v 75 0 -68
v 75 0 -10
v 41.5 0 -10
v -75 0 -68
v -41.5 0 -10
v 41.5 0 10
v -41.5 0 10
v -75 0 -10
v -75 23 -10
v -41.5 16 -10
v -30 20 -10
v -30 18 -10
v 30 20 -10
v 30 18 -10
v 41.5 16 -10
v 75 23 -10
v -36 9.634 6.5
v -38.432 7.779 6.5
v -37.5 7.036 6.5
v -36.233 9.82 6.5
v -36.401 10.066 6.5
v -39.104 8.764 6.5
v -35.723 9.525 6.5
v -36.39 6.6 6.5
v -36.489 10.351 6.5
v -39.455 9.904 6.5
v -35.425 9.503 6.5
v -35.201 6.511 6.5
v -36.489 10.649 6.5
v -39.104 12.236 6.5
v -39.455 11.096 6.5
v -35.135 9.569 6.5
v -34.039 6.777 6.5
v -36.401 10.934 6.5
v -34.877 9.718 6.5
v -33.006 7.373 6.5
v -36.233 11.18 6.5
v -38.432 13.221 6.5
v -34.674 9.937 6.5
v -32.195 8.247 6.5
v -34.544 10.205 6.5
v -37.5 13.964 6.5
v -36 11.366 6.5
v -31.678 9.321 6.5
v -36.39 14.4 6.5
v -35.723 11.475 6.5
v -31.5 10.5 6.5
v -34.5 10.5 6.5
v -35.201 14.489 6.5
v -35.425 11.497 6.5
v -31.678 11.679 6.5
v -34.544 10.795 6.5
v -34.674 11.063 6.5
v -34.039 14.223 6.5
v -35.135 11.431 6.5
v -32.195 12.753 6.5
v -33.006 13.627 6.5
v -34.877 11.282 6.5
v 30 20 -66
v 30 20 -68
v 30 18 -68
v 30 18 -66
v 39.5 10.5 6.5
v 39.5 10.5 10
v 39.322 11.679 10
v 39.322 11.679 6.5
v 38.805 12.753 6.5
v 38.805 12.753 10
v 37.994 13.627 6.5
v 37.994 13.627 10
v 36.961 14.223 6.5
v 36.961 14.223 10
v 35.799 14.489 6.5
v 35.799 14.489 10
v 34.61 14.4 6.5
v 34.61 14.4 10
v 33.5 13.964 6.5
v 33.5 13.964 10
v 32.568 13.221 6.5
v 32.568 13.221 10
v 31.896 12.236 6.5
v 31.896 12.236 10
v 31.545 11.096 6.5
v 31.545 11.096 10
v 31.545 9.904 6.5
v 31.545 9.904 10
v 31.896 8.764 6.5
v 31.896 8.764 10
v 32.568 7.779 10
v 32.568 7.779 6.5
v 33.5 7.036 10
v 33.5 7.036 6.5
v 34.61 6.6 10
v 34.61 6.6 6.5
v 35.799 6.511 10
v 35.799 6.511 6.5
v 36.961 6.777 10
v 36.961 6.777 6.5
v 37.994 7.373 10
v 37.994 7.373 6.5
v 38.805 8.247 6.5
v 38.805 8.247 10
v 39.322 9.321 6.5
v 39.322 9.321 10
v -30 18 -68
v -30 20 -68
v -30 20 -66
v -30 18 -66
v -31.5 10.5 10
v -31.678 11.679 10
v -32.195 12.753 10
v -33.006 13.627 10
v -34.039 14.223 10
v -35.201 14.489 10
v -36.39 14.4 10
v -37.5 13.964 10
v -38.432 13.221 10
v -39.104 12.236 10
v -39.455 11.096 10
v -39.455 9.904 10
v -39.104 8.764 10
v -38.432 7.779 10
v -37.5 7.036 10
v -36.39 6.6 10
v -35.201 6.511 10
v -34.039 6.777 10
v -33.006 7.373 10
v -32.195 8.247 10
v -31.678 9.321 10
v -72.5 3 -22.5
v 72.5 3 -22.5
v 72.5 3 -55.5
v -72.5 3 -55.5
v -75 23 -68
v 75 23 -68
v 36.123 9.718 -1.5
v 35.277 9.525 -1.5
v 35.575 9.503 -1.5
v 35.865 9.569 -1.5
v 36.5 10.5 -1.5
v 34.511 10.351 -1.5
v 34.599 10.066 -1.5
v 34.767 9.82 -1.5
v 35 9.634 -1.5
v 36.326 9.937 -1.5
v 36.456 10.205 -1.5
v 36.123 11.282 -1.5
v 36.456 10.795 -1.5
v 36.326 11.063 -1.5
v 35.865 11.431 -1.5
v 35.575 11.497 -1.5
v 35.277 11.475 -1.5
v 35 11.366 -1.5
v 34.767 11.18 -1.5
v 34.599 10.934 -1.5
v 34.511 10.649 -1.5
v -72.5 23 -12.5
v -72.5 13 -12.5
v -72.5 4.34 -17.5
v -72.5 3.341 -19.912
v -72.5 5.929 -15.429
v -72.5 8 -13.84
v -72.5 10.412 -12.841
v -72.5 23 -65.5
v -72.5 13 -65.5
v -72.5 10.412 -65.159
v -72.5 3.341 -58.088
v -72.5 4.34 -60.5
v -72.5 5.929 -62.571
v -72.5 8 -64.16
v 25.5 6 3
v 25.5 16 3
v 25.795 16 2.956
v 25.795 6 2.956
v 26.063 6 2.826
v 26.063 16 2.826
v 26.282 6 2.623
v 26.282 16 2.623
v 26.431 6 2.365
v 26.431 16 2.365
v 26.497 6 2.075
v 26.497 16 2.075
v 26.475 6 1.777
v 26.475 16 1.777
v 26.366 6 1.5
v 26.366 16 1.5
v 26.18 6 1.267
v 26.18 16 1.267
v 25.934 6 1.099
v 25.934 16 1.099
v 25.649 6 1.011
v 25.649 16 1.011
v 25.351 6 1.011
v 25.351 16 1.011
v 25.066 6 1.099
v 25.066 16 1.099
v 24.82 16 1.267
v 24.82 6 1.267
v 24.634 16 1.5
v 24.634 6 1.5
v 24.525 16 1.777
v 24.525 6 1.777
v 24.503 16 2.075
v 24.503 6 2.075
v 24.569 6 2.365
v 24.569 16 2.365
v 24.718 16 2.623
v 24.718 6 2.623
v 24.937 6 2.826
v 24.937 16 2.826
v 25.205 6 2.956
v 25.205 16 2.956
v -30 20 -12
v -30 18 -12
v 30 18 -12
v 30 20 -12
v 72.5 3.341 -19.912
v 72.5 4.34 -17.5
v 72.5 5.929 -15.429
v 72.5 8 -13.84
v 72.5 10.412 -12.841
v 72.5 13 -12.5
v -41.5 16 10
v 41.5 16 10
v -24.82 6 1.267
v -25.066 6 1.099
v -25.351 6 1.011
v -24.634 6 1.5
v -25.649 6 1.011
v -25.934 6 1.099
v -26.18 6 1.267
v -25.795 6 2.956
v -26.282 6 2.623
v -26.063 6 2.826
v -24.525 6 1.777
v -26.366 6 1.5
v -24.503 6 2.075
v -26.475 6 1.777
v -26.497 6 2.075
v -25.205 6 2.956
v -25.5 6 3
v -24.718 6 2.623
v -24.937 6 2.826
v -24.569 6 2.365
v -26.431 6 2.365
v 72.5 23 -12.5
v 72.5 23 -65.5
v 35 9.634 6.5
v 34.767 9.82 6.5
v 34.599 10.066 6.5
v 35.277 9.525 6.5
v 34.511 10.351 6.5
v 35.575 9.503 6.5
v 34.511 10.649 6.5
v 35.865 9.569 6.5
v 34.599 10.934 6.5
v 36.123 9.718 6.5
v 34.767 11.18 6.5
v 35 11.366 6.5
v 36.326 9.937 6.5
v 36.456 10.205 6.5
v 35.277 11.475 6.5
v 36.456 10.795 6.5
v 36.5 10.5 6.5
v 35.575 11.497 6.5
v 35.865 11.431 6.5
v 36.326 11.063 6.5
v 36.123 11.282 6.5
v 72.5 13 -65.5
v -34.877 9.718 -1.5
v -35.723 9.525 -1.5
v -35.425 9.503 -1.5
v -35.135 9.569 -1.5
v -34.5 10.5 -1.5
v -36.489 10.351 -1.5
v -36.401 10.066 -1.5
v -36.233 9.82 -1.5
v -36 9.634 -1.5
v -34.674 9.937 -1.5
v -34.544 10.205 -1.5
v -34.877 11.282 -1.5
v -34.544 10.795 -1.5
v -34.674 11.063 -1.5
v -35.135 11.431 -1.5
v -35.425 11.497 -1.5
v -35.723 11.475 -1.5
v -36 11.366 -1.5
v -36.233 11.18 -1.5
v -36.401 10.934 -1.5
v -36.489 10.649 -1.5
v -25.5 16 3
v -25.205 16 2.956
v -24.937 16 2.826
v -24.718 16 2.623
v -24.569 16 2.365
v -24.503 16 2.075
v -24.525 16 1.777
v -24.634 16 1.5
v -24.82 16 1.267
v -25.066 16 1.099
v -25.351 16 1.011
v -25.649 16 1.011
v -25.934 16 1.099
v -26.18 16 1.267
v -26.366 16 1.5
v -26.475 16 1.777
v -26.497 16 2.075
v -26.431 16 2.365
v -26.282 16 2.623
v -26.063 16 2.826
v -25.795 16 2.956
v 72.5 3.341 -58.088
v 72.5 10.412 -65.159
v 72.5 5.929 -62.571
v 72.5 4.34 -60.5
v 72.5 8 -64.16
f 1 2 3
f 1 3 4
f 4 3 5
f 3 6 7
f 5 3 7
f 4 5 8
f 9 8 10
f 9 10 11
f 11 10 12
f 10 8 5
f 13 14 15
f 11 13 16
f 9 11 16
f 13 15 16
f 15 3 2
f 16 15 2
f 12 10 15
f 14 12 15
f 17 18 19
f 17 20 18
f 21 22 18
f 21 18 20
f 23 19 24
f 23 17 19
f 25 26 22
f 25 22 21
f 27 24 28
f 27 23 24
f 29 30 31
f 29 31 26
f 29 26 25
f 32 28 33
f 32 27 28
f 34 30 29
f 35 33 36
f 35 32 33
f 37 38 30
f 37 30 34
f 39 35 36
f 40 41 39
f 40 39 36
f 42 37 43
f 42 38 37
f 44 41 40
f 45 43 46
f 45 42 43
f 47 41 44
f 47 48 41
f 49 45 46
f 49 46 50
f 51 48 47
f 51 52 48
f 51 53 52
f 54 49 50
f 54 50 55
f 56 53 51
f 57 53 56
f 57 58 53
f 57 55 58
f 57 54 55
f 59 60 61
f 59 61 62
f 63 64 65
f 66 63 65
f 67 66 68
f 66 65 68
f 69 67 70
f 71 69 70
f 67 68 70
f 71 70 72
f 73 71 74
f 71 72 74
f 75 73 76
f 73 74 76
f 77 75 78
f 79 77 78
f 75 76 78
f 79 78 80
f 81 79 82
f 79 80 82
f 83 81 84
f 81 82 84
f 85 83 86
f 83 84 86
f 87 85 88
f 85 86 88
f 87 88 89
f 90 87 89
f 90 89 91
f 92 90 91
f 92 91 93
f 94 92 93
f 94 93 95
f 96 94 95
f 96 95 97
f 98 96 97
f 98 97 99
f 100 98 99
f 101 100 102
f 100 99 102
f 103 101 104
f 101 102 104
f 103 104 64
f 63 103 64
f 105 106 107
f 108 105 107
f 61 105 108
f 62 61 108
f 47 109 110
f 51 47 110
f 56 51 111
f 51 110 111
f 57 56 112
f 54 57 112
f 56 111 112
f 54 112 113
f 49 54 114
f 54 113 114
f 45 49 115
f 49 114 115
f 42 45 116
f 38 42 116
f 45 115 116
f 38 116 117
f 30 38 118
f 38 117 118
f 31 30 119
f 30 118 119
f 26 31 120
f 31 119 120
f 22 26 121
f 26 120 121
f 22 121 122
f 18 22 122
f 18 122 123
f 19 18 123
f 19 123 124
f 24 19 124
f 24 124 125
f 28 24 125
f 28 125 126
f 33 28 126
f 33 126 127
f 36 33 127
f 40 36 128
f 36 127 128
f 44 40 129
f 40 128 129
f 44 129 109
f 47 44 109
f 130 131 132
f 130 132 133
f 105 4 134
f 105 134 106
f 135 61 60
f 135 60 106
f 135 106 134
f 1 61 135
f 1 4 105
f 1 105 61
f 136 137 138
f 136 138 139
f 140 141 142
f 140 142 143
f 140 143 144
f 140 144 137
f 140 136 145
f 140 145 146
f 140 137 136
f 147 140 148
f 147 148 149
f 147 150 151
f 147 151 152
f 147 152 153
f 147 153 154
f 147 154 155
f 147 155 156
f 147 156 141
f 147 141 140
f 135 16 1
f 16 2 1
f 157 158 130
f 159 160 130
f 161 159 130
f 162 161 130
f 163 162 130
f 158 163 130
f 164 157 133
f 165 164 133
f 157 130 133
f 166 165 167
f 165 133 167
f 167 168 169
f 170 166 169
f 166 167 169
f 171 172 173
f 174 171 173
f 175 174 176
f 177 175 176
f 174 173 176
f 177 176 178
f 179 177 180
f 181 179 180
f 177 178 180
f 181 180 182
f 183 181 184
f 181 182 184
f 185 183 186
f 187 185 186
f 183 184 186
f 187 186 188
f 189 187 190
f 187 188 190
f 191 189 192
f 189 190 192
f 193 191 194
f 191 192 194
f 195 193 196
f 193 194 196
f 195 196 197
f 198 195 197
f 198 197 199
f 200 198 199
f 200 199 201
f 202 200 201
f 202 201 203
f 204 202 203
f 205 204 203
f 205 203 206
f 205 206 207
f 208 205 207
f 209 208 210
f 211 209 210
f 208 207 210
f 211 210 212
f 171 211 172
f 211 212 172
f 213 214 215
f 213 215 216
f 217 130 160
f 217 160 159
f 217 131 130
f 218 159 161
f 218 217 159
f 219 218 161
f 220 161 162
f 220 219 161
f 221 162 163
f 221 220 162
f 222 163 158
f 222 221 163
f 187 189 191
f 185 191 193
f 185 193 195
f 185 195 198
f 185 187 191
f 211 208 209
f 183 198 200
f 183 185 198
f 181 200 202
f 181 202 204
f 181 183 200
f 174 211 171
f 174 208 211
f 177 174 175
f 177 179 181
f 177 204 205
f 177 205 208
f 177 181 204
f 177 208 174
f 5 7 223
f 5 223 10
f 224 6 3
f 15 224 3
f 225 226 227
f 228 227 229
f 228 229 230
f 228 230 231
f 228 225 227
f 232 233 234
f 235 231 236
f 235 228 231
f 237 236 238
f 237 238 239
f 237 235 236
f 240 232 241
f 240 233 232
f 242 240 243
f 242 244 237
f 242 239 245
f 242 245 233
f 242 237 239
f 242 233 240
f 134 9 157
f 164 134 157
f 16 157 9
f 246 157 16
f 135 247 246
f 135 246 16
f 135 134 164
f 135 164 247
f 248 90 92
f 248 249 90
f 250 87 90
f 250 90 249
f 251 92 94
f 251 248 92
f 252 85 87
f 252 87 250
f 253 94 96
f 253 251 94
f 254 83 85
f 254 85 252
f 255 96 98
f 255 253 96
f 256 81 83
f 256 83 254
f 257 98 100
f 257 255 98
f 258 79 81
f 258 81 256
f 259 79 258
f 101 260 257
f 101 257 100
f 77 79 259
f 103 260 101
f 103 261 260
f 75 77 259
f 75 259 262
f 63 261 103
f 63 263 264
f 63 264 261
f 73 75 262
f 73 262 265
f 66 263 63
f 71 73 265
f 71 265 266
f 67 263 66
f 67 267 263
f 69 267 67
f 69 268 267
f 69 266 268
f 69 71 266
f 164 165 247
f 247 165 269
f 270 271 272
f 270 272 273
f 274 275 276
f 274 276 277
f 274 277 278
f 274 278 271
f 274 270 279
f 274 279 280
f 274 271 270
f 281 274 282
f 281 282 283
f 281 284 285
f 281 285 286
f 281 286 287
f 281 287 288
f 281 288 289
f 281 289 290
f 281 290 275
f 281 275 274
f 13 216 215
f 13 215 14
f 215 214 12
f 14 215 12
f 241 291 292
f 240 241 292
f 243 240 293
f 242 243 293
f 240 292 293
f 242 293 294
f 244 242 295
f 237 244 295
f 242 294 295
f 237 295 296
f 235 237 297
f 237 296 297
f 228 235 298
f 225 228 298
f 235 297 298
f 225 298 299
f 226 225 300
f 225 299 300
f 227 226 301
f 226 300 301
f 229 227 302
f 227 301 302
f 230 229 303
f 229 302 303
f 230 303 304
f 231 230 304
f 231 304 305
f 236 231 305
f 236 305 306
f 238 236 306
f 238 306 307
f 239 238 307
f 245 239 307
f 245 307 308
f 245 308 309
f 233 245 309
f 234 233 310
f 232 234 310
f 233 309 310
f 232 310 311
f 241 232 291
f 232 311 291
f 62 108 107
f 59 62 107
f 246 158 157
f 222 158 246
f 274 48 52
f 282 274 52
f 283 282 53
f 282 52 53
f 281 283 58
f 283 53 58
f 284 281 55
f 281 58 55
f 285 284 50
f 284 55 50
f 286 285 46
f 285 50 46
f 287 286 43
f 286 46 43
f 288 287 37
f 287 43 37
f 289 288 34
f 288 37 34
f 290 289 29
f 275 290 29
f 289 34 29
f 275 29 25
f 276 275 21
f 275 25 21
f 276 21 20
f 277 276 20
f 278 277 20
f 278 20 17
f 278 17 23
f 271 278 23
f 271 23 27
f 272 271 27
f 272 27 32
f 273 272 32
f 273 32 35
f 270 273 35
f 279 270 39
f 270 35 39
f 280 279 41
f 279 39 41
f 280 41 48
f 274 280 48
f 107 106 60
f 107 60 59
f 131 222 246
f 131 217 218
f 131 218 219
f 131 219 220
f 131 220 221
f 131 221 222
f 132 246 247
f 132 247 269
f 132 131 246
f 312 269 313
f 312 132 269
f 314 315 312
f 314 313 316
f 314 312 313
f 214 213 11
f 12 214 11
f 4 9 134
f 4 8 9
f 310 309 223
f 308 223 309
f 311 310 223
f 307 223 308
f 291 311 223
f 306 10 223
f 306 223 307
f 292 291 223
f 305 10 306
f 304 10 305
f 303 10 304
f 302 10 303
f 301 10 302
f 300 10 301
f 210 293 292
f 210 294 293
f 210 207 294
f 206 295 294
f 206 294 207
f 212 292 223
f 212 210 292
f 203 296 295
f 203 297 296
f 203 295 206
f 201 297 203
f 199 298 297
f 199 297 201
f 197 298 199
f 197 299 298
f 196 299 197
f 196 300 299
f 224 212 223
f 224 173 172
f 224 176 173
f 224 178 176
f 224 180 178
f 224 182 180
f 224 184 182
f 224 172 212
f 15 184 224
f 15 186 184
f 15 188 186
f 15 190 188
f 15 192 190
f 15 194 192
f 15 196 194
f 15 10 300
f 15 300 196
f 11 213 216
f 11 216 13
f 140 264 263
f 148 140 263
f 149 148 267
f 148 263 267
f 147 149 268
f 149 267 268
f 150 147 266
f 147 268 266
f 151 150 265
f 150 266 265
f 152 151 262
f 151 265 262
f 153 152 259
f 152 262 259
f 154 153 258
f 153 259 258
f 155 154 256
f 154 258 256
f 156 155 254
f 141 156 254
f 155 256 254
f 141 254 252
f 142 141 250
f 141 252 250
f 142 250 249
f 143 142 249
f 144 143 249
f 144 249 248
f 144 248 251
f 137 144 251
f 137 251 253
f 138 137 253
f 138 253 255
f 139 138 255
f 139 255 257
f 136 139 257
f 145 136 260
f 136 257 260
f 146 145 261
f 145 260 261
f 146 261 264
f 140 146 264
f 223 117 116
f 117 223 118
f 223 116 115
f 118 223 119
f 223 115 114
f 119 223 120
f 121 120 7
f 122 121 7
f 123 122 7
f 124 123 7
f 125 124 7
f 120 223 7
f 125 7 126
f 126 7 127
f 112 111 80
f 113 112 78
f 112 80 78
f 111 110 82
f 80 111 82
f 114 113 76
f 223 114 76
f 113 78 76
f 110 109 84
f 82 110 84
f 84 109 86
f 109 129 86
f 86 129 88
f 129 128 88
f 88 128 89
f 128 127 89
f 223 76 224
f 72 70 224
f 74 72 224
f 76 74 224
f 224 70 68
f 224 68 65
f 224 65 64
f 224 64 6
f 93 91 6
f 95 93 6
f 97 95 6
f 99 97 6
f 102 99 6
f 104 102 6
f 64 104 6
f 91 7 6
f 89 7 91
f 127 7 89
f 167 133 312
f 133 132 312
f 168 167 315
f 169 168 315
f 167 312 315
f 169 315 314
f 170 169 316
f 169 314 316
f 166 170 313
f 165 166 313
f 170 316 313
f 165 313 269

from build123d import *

# Parameters (mm, degrees)
SKETCH_1_W          = 83
SKETCH_1_H          = 20
EXTRUDE_1_DEPTH     = 16
SKETCH_2_R          = 4
CUT_EXTRUDE_1_DEPTH = 3.5
SKETCH_3_R          = 1
CUT_EXTRUDE_2_DEPTH = 10
SKETCH_6_R          = 1
CUT_EXTRUDE_5_DEPTH = 8
SKETCH_7_W          = 150
SKETCH_7_H          = 3
EXTRUDE_2_DEPTH     = 58
SKETCH_8_W          = 150
SKETCH_8_H          = 58
SKETCH_8_W_2        = 145
SKETCH_8_H_2        = 53
EXTRUDE_3_DEPTH     = 20
FILLET_1_R          = 10
CUT_EXTRUDE_START   = -45
SKETCH_9_W          = 2
SKETCH_9_H          = 2
CUT_EXTRUDE_6_DEPTH = 60


with BuildPart() as part:
    # 스케치1 → 보스-돌출1 (new body)
    with BuildSketch(Plane(origin=(0, 0, 0), x_dir=(1, 0, 0), z_dir=(0, 1, 0))):
        Rectangle(SKETCH_1_W, SKETCH_1_H)
    extrude(amount=EXTRUDE_1_DEPTH)

    # 스케치2 → 컷-돌출1 (cut)
    with BuildSketch(Plane.XY.offset(10)):
        with Locations((-35.5, 10.5)):
            Circle(SKETCH_2_R)
        with Locations((35.5, 10.5)):
            Circle(SKETCH_2_R)
    extrude(amount=-CUT_EXTRUDE_1_DEPTH, mode=Mode.SUBTRACT)

    # 스케치3 → 컷-돌출2 (cut)
    with BuildSketch(Plane(origin=(0, 16, 0), x_dir=(1, 0, 0), z_dir=(0, 1, 0))):
        with Locations(Location((-25.5, -2, 0), (0, 0, 270))):
            Circle(SKETCH_3_R)
        with Locations(Location((25.5, -2, 0), (0, 0, 270))):
            Circle(SKETCH_3_R)
    extrude(amount=-CUT_EXTRUDE_2_DEPTH, mode=Mode.SUBTRACT)

    # 스케치6 → 컷-돌출5 (cut)
    with BuildSketch(Plane.XY.offset(6.5)):
        with Locations((-35.5, 10.5)):
            Circle(SKETCH_6_R)
        with Locations((35.5, 10.5)):
            Circle(SKETCH_6_R)
    extrude(amount=-CUT_EXTRUDE_5_DEPTH, mode=Mode.SUBTRACT)

    # 스케치7 → 보스-돌출2 (add)
    with BuildSketch(Plane(origin=(0, 0, -10), x_dir=(-1, 0, 0), z_dir=(0, 0, -1))):
        with Locations((0, 1.5)):
            Rectangle(SKETCH_7_W, SKETCH_7_H)
    extrude(amount=EXTRUDE_2_DEPTH)

    # 스케치8 → 보스-돌출3 (add)
    with BuildSketch(Plane(origin=(0, 3, 0), x_dir=(1, 0, 0), z_dir=(0, 1, 0))):
        with Locations((0, 39)):
            Rectangle(SKETCH_8_W, SKETCH_8_H)
        with Locations((0, 39)):
            Rectangle(SKETCH_8_W_2, SKETCH_8_H_2, mode=Mode.SUBTRACT)
    extrude(amount=EXTRUDE_3_DEPTH)

    # 필렛1
    fillet_1_edges = [part.edges().sort_by_distance(p)[0] for p in [
        (0, 3, -65.5),
        (0, 3, -12.5),
    ]]
    fillet(fillet_1_edges, radius=FILLET_1_R)

    # 스케치9 → 컷-돌출6 (cut)
    with BuildSketch(Plane.ZY.offset(75).offset(CUT_EXTRUDE_START)):
        with Locations((-67, 19)):
            Rectangle(SKETCH_9_W, SKETCH_9_H)
        with Locations((-11, 19)):
            Rectangle(SKETCH_9_W, SKETCH_9_H)
    extrude(amount=-CUT_EXTRUDE_6_DEPTH, mode=Mode.SUBTRACT)


solid = part.part
